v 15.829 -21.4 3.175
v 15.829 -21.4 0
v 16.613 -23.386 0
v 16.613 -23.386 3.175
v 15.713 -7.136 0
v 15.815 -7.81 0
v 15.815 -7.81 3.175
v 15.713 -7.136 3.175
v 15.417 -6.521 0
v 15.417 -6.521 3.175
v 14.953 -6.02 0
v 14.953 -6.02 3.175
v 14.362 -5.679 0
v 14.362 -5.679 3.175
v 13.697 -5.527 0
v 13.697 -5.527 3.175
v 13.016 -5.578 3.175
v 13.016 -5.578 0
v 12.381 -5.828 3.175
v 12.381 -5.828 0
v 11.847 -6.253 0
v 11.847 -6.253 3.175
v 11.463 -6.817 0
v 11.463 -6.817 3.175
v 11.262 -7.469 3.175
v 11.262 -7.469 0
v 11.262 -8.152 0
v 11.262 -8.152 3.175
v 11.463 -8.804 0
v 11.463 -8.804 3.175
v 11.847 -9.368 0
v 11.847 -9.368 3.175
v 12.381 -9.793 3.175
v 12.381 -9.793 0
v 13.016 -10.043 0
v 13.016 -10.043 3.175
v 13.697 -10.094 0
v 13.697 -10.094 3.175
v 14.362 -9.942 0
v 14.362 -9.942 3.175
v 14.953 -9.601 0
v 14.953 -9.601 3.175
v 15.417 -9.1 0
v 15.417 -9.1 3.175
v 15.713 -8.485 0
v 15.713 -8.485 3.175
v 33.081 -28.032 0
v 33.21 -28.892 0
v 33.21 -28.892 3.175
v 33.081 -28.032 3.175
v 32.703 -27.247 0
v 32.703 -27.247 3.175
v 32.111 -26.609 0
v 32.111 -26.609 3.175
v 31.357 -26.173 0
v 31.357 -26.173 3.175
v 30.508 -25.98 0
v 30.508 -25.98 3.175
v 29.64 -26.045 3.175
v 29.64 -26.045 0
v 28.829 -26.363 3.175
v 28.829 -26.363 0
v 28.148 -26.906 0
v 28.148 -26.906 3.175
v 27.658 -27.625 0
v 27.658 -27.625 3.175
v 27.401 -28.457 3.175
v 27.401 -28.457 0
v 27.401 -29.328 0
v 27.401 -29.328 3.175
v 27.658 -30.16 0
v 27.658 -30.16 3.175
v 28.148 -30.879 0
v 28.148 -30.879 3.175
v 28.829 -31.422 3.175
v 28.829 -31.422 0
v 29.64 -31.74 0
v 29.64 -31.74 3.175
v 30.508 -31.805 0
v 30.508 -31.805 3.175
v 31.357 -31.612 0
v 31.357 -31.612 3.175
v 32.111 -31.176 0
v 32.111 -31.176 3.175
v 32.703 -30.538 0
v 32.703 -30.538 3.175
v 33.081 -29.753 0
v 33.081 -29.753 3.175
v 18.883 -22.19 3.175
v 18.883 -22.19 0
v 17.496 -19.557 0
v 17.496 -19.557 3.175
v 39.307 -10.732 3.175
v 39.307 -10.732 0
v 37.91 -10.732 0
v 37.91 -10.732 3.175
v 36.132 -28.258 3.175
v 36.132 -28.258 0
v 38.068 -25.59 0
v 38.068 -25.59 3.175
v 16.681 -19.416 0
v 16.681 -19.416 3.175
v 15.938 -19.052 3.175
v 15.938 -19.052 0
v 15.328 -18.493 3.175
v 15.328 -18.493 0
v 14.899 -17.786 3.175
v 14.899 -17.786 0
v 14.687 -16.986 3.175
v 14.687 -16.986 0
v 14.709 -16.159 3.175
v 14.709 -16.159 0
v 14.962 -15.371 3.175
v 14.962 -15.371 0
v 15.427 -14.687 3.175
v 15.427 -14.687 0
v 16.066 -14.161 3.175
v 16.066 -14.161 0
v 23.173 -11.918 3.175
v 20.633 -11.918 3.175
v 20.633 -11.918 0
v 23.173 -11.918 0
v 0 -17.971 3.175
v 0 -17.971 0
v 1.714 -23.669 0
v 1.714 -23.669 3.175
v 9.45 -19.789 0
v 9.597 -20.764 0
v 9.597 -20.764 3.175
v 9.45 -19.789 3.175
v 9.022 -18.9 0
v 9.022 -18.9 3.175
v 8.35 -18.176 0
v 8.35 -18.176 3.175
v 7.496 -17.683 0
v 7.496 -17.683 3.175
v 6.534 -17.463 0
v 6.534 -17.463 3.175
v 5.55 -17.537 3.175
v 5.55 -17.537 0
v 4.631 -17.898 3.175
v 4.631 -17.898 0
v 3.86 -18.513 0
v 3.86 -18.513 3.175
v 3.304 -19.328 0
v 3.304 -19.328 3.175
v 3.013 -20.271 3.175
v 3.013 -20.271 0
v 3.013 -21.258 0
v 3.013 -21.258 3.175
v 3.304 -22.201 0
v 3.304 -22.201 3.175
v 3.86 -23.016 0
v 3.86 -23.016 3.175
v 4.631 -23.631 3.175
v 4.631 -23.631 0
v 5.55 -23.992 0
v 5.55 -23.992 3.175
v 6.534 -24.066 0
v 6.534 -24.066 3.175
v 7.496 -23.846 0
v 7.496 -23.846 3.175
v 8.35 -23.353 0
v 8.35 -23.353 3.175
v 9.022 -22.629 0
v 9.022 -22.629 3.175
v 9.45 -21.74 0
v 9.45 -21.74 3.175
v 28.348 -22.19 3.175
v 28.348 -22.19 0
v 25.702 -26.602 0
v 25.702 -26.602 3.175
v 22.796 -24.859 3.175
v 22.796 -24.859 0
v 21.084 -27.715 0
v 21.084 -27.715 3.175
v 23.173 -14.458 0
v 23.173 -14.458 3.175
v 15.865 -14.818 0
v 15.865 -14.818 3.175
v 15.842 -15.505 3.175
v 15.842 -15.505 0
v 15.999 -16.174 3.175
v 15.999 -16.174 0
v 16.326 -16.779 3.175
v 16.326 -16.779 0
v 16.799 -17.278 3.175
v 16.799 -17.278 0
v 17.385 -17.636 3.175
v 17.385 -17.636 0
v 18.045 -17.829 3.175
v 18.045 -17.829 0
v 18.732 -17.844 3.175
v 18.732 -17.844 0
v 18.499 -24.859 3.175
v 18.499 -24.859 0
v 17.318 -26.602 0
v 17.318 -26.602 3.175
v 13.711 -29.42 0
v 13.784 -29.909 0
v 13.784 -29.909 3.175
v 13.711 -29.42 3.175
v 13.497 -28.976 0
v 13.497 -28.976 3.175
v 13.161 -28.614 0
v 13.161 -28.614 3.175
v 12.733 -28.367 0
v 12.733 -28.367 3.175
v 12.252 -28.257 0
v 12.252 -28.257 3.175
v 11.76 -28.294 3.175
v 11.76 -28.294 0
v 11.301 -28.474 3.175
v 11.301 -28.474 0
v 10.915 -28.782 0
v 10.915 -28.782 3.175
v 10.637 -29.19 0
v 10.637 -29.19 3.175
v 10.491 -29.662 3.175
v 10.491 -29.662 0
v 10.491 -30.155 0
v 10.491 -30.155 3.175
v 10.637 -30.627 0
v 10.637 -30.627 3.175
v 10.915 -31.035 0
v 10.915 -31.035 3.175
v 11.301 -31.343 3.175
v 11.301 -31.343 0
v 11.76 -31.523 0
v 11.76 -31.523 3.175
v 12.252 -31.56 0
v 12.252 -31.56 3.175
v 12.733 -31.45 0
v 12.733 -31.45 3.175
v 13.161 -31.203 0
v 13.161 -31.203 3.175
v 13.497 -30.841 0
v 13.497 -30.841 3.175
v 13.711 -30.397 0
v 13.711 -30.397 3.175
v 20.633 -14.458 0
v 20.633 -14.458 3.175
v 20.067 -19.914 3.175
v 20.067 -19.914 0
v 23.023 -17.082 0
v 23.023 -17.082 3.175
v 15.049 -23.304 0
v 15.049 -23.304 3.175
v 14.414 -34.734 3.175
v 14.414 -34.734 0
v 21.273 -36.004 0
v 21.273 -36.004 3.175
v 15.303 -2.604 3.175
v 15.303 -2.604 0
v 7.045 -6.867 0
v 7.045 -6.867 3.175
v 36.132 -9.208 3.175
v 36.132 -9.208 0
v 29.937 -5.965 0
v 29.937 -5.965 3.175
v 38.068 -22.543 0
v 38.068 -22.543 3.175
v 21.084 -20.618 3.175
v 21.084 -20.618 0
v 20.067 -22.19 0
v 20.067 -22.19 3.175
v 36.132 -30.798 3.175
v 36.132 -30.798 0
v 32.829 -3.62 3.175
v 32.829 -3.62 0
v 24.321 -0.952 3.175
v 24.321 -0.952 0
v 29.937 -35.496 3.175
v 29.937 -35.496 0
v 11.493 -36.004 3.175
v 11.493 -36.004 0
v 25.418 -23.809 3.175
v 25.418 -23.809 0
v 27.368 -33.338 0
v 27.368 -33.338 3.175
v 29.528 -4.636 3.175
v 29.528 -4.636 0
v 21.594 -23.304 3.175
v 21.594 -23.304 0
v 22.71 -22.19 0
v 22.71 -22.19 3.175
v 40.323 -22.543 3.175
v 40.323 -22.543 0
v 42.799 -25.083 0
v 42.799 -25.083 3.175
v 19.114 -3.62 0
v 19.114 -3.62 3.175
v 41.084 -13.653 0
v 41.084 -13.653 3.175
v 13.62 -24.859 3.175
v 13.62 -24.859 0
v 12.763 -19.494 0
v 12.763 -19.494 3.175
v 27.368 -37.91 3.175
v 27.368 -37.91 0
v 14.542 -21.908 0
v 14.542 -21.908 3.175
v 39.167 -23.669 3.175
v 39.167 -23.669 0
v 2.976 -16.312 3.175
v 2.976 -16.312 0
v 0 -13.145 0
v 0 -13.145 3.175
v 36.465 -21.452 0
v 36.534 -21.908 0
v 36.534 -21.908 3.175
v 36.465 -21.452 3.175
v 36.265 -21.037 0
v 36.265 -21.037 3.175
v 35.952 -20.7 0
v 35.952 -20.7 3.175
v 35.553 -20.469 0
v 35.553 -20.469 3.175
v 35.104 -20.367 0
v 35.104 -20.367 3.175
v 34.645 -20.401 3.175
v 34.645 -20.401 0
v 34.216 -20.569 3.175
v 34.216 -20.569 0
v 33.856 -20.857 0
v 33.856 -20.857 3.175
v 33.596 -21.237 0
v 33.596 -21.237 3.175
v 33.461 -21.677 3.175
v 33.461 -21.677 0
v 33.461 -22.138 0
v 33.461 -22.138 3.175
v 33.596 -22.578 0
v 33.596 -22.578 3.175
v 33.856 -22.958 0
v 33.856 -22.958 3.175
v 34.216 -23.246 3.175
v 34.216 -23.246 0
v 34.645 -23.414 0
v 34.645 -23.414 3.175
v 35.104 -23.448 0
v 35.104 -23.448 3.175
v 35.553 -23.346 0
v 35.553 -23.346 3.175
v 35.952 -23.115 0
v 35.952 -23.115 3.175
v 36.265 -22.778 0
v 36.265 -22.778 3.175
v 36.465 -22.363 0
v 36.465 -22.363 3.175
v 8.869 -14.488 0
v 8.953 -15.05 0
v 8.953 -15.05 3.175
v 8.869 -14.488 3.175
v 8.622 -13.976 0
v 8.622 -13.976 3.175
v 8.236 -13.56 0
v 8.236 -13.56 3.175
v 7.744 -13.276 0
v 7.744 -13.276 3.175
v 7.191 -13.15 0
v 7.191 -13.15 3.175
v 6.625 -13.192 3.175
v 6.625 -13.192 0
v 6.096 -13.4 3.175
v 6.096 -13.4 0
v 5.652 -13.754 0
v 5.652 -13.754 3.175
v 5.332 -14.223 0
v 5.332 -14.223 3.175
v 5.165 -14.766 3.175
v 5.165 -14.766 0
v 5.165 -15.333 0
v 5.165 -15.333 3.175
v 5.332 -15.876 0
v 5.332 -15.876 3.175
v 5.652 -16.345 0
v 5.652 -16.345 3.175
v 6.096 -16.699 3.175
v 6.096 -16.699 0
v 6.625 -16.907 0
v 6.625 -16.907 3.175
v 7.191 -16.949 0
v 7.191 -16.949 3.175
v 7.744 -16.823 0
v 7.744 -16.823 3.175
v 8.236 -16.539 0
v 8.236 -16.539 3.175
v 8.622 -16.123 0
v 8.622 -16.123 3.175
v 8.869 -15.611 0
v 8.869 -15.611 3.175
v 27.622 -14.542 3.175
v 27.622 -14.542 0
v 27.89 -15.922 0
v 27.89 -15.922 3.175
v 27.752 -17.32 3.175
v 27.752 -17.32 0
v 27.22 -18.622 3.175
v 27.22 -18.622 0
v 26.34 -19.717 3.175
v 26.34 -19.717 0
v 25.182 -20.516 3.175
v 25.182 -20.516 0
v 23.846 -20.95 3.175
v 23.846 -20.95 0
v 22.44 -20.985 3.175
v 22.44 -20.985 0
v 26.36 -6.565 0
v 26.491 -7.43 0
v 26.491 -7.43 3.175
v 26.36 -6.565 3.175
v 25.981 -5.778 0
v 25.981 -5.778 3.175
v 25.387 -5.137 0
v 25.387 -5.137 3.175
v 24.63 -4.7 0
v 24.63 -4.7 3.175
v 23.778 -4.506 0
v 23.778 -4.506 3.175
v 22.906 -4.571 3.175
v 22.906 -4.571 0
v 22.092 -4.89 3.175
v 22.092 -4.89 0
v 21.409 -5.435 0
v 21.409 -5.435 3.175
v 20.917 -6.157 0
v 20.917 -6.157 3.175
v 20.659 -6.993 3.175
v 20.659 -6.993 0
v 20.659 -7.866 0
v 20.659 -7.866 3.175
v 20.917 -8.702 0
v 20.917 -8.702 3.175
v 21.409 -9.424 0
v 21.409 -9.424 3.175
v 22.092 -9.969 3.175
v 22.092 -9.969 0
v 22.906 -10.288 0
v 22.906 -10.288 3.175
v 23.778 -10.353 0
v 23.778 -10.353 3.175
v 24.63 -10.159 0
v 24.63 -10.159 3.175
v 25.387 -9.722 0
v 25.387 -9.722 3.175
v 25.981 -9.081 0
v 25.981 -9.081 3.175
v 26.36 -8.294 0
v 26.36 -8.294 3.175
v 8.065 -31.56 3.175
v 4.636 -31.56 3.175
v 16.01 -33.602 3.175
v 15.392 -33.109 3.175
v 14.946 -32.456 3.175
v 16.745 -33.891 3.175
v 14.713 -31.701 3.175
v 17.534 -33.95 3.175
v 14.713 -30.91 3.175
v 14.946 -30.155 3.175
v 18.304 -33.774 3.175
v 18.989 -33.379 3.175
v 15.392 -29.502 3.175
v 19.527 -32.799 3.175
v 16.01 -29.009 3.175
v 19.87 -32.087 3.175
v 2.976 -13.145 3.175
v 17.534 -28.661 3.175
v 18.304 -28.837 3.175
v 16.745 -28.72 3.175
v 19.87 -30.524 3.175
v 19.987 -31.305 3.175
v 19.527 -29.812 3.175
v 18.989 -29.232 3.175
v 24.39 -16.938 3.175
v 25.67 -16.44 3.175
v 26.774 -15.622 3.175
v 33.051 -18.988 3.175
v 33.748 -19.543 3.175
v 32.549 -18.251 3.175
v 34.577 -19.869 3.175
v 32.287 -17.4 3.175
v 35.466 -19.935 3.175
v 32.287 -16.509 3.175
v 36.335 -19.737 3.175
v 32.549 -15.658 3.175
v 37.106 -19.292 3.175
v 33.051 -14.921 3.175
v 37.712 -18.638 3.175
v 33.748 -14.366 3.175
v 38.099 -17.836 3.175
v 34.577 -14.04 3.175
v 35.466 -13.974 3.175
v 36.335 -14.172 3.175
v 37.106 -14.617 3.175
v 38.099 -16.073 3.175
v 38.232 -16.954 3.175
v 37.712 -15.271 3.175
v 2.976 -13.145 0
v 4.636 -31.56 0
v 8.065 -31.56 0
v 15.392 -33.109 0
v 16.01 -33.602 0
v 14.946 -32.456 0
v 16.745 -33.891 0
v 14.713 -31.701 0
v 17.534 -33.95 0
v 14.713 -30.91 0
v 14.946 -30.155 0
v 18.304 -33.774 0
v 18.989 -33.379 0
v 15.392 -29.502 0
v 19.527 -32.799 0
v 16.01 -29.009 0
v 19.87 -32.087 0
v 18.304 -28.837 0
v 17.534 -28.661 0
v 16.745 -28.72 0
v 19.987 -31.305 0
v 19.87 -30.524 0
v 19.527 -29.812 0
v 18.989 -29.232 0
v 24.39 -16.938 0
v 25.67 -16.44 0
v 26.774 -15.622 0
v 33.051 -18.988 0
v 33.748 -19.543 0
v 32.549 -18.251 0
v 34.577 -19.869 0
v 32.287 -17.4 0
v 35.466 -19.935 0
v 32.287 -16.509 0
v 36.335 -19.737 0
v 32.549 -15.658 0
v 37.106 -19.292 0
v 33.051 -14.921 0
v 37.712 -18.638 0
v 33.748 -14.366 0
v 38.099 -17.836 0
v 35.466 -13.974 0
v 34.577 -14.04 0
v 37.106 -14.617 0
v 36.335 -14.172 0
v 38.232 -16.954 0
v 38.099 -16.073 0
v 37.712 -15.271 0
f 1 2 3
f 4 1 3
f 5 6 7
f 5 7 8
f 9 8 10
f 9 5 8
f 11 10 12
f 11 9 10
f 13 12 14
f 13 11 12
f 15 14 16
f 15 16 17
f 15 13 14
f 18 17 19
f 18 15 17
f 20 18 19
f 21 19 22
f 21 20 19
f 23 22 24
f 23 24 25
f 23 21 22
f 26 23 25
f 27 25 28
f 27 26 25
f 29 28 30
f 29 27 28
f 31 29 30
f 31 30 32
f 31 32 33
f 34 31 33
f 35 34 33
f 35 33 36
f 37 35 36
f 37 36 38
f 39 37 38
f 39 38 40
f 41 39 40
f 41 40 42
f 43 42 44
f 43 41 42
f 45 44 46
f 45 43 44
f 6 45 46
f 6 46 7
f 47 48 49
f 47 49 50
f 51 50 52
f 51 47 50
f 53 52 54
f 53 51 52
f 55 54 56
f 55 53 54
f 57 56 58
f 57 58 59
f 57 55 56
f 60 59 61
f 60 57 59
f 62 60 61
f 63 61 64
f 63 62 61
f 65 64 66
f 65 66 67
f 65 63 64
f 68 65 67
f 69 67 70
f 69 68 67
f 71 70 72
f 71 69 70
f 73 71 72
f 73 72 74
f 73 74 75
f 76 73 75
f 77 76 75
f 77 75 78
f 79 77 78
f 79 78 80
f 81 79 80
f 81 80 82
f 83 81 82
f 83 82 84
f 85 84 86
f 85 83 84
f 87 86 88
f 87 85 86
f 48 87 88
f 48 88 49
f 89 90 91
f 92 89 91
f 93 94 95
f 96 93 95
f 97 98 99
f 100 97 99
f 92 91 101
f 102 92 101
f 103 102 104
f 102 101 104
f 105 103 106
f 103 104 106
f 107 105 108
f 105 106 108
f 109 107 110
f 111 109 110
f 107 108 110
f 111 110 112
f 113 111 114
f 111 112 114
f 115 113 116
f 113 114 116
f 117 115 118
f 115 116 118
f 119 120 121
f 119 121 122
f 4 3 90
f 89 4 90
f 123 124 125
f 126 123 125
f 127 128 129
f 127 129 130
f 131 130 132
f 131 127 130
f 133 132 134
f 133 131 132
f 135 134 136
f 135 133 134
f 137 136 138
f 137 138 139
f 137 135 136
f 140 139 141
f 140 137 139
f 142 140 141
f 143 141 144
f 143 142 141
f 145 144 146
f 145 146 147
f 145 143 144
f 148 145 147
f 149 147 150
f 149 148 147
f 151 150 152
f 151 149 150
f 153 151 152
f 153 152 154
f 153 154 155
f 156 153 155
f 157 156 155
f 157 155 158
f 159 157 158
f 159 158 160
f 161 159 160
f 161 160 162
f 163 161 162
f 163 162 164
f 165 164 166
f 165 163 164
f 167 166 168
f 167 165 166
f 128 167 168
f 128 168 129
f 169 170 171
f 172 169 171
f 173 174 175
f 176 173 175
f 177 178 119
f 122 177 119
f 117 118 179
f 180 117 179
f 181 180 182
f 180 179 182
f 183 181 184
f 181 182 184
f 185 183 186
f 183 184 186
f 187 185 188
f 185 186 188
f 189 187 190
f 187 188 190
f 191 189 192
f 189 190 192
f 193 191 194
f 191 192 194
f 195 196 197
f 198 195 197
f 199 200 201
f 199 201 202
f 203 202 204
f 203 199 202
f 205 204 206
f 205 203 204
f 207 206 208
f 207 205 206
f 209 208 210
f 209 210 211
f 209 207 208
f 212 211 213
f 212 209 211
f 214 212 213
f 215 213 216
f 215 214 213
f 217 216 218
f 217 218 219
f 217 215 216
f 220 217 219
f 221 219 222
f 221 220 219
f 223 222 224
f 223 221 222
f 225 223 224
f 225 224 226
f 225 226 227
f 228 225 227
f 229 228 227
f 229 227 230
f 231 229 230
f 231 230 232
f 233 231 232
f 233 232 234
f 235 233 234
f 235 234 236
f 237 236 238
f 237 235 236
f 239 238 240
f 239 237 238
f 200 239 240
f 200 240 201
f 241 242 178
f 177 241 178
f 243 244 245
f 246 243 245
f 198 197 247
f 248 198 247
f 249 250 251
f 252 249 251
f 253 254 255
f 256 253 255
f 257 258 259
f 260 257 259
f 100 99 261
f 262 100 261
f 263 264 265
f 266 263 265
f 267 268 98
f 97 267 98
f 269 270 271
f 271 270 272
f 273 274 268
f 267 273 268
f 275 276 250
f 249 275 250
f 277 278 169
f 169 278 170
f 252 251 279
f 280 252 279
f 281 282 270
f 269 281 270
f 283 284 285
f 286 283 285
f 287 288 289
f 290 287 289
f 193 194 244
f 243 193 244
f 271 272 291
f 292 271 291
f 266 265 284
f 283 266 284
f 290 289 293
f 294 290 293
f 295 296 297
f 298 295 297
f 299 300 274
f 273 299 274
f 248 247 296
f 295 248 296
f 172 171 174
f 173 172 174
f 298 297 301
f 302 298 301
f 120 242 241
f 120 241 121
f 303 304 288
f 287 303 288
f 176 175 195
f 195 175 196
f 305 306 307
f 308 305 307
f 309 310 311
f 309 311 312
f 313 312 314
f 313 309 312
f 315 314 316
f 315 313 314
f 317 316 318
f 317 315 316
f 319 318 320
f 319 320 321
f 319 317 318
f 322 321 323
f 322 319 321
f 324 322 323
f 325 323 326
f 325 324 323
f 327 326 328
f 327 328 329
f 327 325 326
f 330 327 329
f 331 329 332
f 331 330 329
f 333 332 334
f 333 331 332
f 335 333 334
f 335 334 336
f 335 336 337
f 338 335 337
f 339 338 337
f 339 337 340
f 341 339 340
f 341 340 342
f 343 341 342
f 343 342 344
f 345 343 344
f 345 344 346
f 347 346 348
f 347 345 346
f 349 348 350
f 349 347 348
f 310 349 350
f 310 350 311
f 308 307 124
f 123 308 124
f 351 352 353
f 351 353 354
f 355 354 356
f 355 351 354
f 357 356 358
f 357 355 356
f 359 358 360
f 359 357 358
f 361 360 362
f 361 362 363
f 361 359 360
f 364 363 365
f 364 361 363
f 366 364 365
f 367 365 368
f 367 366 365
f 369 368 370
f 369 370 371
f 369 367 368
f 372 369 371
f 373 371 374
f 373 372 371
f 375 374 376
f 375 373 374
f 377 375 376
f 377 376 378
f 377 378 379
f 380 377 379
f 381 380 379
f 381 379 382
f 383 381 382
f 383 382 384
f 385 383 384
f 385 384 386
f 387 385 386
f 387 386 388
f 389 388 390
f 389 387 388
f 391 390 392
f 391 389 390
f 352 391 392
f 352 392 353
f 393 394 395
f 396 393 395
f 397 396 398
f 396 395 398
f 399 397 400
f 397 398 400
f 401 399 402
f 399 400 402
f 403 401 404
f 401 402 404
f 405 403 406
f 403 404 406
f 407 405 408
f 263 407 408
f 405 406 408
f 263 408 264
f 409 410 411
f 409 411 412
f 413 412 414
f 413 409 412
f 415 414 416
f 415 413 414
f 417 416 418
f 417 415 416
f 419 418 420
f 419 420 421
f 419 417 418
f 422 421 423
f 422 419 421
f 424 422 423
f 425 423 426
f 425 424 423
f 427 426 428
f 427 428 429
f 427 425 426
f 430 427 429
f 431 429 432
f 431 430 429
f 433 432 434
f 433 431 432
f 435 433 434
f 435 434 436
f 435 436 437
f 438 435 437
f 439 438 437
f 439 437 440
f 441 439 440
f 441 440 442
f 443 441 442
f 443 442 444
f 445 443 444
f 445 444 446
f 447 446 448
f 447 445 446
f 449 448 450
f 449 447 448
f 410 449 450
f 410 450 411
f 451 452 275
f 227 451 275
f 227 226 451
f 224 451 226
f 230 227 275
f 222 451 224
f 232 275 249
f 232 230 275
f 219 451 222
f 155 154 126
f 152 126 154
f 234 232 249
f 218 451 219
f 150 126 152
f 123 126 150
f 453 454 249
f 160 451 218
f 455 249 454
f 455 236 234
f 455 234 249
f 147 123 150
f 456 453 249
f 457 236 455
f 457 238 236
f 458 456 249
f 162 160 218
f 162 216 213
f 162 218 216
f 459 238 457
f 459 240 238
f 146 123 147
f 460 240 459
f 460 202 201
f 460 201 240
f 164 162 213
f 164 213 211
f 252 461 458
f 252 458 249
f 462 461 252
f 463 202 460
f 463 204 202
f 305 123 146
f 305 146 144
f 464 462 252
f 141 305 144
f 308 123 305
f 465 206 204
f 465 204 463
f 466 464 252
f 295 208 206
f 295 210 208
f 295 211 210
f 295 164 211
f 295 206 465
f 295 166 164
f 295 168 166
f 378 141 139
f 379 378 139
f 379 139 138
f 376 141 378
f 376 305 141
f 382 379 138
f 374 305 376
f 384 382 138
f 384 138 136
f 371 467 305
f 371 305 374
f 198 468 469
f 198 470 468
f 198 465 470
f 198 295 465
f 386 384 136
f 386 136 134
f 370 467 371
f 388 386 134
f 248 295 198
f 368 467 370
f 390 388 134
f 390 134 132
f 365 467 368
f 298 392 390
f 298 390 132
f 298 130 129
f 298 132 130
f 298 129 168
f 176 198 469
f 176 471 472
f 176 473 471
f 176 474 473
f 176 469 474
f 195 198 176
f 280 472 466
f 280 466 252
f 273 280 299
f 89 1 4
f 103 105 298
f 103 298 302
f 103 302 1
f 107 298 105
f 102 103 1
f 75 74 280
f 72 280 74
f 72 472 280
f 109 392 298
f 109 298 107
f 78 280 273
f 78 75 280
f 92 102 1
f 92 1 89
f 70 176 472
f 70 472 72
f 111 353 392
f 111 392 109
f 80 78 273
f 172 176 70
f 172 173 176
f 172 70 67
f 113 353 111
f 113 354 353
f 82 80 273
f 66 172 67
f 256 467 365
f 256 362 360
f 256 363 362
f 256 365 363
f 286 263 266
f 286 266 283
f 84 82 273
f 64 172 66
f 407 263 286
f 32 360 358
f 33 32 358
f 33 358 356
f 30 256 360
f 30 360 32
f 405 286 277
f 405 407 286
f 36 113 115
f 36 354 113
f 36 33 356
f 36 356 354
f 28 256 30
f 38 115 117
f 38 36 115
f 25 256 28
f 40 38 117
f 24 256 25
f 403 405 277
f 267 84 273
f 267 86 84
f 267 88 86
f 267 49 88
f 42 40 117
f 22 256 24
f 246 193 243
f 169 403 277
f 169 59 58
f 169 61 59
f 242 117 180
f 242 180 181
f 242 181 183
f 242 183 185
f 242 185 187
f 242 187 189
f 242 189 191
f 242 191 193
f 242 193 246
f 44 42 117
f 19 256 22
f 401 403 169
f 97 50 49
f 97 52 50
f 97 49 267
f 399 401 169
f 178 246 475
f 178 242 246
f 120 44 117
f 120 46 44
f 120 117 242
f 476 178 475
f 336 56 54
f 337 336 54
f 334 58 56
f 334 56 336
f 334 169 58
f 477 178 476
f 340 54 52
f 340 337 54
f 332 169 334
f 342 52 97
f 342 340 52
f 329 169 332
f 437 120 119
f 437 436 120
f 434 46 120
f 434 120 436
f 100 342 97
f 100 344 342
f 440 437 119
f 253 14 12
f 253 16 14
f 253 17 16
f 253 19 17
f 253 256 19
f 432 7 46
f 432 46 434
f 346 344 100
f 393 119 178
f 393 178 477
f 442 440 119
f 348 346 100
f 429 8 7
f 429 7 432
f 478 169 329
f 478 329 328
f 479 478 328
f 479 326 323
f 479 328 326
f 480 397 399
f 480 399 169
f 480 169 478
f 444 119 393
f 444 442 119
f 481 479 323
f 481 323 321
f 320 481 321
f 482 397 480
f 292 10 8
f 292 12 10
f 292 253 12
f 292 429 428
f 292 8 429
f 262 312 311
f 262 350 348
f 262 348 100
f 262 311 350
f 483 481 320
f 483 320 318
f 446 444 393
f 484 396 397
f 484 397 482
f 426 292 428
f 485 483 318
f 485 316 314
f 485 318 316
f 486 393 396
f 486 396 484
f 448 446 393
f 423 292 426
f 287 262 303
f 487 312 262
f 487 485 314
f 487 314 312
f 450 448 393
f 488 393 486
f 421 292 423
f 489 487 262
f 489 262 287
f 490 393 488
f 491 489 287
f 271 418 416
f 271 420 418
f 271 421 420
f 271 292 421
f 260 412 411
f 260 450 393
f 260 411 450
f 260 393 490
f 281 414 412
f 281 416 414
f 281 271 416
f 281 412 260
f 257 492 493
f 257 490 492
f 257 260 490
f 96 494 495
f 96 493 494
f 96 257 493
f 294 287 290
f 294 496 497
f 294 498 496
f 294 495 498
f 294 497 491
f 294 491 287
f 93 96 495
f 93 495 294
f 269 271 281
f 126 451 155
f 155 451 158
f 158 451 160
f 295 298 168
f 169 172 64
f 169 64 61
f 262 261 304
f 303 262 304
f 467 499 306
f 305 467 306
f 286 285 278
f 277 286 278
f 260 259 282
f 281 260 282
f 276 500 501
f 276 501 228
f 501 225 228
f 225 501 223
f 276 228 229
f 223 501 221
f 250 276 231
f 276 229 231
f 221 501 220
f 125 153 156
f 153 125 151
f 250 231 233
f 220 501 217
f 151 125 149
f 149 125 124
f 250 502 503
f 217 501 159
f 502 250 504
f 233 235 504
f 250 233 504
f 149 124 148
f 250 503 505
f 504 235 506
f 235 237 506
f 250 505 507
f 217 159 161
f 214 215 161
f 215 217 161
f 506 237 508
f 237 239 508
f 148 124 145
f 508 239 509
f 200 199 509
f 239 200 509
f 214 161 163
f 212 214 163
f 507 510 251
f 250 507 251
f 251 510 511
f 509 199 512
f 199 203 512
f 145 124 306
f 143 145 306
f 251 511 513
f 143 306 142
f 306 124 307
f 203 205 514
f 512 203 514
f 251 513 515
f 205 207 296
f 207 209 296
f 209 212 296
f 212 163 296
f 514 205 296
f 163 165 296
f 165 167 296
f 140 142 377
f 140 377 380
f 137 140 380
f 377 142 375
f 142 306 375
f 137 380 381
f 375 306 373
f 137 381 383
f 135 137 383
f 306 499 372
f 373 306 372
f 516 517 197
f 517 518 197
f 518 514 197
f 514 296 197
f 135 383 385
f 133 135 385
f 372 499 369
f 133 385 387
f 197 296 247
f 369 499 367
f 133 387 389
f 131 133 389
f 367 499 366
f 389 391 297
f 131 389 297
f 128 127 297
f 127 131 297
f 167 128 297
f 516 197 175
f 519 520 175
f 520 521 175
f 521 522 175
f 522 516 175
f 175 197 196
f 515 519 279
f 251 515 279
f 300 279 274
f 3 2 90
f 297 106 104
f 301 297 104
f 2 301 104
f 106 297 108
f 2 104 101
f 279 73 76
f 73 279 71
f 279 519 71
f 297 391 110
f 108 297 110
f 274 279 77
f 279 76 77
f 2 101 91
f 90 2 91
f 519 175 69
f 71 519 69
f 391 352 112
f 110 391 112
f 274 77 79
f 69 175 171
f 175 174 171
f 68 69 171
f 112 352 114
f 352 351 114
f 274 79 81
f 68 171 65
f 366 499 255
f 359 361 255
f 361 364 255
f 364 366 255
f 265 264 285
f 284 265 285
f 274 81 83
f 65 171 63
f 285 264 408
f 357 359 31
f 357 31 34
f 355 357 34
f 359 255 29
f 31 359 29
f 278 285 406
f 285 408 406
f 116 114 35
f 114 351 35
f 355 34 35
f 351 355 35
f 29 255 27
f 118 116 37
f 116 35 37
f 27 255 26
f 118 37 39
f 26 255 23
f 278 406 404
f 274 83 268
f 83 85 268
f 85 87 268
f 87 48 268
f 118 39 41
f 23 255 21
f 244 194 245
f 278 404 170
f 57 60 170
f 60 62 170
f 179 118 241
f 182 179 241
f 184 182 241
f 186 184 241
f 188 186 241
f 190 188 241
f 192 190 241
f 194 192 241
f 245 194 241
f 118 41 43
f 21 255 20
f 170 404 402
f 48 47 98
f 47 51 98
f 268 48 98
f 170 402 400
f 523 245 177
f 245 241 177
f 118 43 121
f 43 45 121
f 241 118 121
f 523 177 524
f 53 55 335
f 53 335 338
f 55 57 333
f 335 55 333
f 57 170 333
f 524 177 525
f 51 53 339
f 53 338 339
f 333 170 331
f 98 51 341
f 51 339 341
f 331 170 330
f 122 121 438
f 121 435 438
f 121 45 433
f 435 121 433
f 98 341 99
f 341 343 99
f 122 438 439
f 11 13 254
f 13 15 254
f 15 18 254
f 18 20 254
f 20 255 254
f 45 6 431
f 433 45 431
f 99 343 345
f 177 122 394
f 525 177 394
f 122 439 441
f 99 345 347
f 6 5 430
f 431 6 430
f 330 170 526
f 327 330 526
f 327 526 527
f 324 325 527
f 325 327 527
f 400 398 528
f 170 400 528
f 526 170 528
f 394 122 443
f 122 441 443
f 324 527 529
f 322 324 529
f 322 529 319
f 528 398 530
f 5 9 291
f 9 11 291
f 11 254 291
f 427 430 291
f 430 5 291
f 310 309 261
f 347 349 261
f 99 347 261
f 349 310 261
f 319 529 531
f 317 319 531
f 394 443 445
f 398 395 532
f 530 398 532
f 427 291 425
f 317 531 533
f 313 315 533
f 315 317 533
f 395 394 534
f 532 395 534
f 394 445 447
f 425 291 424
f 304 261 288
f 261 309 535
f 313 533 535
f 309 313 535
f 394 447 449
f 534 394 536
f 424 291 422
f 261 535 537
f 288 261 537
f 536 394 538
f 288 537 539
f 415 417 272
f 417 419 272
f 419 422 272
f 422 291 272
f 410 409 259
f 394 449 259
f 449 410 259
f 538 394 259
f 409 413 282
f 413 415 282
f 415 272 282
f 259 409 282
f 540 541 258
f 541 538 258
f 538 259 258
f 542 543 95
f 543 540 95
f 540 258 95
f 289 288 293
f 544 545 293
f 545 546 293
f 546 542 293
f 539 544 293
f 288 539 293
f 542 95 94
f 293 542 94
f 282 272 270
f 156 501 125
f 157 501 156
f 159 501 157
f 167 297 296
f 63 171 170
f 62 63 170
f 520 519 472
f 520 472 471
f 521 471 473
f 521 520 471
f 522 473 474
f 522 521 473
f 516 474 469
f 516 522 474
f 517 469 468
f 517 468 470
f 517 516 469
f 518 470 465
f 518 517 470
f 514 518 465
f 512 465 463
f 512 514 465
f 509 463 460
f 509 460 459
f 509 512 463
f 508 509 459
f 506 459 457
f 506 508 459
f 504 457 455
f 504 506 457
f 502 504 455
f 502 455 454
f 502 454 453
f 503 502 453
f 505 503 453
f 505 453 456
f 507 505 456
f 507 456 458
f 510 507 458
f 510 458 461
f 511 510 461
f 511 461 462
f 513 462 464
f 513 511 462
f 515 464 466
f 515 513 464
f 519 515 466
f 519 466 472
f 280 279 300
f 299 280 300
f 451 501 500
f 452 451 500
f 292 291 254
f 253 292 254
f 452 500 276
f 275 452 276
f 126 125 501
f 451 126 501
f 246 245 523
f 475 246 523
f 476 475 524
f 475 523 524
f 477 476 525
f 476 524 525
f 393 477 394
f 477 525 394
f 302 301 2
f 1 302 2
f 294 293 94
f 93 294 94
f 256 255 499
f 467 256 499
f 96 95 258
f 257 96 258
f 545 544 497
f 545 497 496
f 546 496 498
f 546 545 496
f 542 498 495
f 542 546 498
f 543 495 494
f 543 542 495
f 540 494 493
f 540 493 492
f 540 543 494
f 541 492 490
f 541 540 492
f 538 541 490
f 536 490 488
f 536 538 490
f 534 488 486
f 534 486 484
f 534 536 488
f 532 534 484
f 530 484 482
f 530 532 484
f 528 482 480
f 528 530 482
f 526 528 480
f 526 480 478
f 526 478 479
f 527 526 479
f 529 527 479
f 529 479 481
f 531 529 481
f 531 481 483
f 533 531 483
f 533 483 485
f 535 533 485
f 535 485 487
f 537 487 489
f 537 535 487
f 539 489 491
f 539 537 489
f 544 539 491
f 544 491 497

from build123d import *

# Parameters (mm, degrees)
F0_R     = 1.655877
F0_R_2   = 2.651838
F0_R_3   = 3.310353
F0_R_4   = 2.921
F0_R_5   = 1.545023
F0_R_6   = 1.905
F0_R_7   = 2.289524
F0_R_8   = 2.989225
F0_R_9   = 2.932024
F1_DEPTH = 3.175
F2_W     = 2.54
F2_H     = 2.54
F3_DEPTH = 3.175


with BuildPart() as f1:
    # F0 (on Top) → F1 (new body)
    with BuildSketch(Plane.XY):
        Polygon((32.829497, -3.6195), (24.320502, -0.9525), (19.1135, -3.6195), (15.303499, -2.6035), (7.044703, -6.867298), (2.976148, -13.144501), (2.976148, -16.312003), (0, -13.144501), (0, -17.970501), (1.7145, -23.669264), (8.064501, -31.559501), (4.6355, -31.559501), (11.493499, -36.004499), (14.414499, -34.734499), (21.272501, -36.004499), (27.368499, -33.3375), (27.368499, -37.9095), (29.936647, -35.496499), (36.131501, -30.7975), (36.131501, -28.2575), (38.068253, -25.5905), (38.068253, -22.542501), (39.166847, -23.669264), (40.322501, -22.542501), (42.799, -25.082501), (41.084498, -13.652501), (39.306503, -10.731501), (37.9095, -10.731501), (36.131501, -9.2075), (29.936647, -5.965224), (29.5275, -4.6355), align=None)
        with Locations((12.128499, -29.908501)):
            Circle(F0_R, mode=Mode.SUBTRACT)
        with Locations((17.335502, -31.305499)):
            Circle(F0_R_2, mode=Mode.SUBTRACT)
        with Locations((6.286501, -20.7645)):
            Circle(F0_R_3, mode=Mode.SUBTRACT)
        with BuildLine():
            Line((13.620393, -24.859201), (12.763499, -19.4945))
            Line((12.763499, -19.4945), (14.541501, -21.907501))
            Line((14.541501, -21.907501), (15.829229, -21.3995))
            Line((15.829229, -21.3995), (16.612777, -23.38571))
            Line((16.612777, -23.38571), (18.882671, -22.190495))
            Line((18.882671, -22.190495), (17.496092, -19.557172))
            ThreePointArc((17.496092, -19.557172), (14.764748, -17.393266), (16.065503, -14.160501))
            ThreePointArc((16.065503, -14.160501), (16.325903, -16.779071), (18.732499, -17.8435))
            Line((18.732499, -17.8435), (20.067376, -19.913881))
            Line((20.067376, -19.913881), (23.023179, -17.081501))
            ThreePointArc((23.023179, -17.081501), (25.66988, -16.439906), (27.6225, -14.5415))
            ThreePointArc((27.6225, -14.5415), (26.339514, -19.717253), (21.083658, -20.6175))
            Line((21.083658, -20.6175), (20.067376, -22.190495))
            Line((20.067376, -22.190495), (21.594148, -23.3045))
            Line((21.594148, -23.3045), (22.709592, -22.190495))
            Line((22.709592, -22.190495), (25.418346, -23.809462))
            Line((25.418346, -23.809462), (28.348263, -22.190495))
            Line((28.348263, -22.190495), (25.701909, -26.60206))
            Line((25.701909, -26.60206), (22.7965, -24.859201))
            Line((22.7965, -24.859201), (21.083658, -27.71457))
            Line((21.083658, -27.71457), (18.498735, -24.859201))
            Line((18.498735, -24.859201), (17.318298, -26.60206))
            Line((17.318298, -26.60206), (15.049499, -23.3045))
            Line((15.049499, -23.3045), (13.620393, -24.859201))
        make_face(mode=Mode.SUBTRACT)
        with Locations((30.289499, -28.8925)):
            Circle(F0_R_4, mode=Mode.SUBTRACT)
        with Locations((34.9885, -21.907501)):
            Circle(F0_R_5, mode=Mode.SUBTRACT)
        with Locations((7.048499, -15.0495)):
            Circle(F0_R_6, mode=Mode.SUBTRACT)
        with Locations((13.5255, -7.8105)):
            Circle(F0_R_7, mode=Mode.SUBTRACT)
        with Locations((35.242502, -16.9545)):
            Circle(F0_R_8, mode=Mode.SUBTRACT)
        with Locations((23.558499, -7.4295)):
            Circle(F0_R_9, mode=Mode.SUBTRACT)
    extrude(amount=F1_DEPTH)

    # F2 (on face) → F3 (cut)
    with BuildSketch(Plane.XY.offset(3.175)):
        with Locations((21.902567, -13.187881)):
            Rectangle(F2_W, F2_H)
    extrude(amount=-F3_DEPTH, mode=Mode.SUBTRACT)


solid = f1.part
